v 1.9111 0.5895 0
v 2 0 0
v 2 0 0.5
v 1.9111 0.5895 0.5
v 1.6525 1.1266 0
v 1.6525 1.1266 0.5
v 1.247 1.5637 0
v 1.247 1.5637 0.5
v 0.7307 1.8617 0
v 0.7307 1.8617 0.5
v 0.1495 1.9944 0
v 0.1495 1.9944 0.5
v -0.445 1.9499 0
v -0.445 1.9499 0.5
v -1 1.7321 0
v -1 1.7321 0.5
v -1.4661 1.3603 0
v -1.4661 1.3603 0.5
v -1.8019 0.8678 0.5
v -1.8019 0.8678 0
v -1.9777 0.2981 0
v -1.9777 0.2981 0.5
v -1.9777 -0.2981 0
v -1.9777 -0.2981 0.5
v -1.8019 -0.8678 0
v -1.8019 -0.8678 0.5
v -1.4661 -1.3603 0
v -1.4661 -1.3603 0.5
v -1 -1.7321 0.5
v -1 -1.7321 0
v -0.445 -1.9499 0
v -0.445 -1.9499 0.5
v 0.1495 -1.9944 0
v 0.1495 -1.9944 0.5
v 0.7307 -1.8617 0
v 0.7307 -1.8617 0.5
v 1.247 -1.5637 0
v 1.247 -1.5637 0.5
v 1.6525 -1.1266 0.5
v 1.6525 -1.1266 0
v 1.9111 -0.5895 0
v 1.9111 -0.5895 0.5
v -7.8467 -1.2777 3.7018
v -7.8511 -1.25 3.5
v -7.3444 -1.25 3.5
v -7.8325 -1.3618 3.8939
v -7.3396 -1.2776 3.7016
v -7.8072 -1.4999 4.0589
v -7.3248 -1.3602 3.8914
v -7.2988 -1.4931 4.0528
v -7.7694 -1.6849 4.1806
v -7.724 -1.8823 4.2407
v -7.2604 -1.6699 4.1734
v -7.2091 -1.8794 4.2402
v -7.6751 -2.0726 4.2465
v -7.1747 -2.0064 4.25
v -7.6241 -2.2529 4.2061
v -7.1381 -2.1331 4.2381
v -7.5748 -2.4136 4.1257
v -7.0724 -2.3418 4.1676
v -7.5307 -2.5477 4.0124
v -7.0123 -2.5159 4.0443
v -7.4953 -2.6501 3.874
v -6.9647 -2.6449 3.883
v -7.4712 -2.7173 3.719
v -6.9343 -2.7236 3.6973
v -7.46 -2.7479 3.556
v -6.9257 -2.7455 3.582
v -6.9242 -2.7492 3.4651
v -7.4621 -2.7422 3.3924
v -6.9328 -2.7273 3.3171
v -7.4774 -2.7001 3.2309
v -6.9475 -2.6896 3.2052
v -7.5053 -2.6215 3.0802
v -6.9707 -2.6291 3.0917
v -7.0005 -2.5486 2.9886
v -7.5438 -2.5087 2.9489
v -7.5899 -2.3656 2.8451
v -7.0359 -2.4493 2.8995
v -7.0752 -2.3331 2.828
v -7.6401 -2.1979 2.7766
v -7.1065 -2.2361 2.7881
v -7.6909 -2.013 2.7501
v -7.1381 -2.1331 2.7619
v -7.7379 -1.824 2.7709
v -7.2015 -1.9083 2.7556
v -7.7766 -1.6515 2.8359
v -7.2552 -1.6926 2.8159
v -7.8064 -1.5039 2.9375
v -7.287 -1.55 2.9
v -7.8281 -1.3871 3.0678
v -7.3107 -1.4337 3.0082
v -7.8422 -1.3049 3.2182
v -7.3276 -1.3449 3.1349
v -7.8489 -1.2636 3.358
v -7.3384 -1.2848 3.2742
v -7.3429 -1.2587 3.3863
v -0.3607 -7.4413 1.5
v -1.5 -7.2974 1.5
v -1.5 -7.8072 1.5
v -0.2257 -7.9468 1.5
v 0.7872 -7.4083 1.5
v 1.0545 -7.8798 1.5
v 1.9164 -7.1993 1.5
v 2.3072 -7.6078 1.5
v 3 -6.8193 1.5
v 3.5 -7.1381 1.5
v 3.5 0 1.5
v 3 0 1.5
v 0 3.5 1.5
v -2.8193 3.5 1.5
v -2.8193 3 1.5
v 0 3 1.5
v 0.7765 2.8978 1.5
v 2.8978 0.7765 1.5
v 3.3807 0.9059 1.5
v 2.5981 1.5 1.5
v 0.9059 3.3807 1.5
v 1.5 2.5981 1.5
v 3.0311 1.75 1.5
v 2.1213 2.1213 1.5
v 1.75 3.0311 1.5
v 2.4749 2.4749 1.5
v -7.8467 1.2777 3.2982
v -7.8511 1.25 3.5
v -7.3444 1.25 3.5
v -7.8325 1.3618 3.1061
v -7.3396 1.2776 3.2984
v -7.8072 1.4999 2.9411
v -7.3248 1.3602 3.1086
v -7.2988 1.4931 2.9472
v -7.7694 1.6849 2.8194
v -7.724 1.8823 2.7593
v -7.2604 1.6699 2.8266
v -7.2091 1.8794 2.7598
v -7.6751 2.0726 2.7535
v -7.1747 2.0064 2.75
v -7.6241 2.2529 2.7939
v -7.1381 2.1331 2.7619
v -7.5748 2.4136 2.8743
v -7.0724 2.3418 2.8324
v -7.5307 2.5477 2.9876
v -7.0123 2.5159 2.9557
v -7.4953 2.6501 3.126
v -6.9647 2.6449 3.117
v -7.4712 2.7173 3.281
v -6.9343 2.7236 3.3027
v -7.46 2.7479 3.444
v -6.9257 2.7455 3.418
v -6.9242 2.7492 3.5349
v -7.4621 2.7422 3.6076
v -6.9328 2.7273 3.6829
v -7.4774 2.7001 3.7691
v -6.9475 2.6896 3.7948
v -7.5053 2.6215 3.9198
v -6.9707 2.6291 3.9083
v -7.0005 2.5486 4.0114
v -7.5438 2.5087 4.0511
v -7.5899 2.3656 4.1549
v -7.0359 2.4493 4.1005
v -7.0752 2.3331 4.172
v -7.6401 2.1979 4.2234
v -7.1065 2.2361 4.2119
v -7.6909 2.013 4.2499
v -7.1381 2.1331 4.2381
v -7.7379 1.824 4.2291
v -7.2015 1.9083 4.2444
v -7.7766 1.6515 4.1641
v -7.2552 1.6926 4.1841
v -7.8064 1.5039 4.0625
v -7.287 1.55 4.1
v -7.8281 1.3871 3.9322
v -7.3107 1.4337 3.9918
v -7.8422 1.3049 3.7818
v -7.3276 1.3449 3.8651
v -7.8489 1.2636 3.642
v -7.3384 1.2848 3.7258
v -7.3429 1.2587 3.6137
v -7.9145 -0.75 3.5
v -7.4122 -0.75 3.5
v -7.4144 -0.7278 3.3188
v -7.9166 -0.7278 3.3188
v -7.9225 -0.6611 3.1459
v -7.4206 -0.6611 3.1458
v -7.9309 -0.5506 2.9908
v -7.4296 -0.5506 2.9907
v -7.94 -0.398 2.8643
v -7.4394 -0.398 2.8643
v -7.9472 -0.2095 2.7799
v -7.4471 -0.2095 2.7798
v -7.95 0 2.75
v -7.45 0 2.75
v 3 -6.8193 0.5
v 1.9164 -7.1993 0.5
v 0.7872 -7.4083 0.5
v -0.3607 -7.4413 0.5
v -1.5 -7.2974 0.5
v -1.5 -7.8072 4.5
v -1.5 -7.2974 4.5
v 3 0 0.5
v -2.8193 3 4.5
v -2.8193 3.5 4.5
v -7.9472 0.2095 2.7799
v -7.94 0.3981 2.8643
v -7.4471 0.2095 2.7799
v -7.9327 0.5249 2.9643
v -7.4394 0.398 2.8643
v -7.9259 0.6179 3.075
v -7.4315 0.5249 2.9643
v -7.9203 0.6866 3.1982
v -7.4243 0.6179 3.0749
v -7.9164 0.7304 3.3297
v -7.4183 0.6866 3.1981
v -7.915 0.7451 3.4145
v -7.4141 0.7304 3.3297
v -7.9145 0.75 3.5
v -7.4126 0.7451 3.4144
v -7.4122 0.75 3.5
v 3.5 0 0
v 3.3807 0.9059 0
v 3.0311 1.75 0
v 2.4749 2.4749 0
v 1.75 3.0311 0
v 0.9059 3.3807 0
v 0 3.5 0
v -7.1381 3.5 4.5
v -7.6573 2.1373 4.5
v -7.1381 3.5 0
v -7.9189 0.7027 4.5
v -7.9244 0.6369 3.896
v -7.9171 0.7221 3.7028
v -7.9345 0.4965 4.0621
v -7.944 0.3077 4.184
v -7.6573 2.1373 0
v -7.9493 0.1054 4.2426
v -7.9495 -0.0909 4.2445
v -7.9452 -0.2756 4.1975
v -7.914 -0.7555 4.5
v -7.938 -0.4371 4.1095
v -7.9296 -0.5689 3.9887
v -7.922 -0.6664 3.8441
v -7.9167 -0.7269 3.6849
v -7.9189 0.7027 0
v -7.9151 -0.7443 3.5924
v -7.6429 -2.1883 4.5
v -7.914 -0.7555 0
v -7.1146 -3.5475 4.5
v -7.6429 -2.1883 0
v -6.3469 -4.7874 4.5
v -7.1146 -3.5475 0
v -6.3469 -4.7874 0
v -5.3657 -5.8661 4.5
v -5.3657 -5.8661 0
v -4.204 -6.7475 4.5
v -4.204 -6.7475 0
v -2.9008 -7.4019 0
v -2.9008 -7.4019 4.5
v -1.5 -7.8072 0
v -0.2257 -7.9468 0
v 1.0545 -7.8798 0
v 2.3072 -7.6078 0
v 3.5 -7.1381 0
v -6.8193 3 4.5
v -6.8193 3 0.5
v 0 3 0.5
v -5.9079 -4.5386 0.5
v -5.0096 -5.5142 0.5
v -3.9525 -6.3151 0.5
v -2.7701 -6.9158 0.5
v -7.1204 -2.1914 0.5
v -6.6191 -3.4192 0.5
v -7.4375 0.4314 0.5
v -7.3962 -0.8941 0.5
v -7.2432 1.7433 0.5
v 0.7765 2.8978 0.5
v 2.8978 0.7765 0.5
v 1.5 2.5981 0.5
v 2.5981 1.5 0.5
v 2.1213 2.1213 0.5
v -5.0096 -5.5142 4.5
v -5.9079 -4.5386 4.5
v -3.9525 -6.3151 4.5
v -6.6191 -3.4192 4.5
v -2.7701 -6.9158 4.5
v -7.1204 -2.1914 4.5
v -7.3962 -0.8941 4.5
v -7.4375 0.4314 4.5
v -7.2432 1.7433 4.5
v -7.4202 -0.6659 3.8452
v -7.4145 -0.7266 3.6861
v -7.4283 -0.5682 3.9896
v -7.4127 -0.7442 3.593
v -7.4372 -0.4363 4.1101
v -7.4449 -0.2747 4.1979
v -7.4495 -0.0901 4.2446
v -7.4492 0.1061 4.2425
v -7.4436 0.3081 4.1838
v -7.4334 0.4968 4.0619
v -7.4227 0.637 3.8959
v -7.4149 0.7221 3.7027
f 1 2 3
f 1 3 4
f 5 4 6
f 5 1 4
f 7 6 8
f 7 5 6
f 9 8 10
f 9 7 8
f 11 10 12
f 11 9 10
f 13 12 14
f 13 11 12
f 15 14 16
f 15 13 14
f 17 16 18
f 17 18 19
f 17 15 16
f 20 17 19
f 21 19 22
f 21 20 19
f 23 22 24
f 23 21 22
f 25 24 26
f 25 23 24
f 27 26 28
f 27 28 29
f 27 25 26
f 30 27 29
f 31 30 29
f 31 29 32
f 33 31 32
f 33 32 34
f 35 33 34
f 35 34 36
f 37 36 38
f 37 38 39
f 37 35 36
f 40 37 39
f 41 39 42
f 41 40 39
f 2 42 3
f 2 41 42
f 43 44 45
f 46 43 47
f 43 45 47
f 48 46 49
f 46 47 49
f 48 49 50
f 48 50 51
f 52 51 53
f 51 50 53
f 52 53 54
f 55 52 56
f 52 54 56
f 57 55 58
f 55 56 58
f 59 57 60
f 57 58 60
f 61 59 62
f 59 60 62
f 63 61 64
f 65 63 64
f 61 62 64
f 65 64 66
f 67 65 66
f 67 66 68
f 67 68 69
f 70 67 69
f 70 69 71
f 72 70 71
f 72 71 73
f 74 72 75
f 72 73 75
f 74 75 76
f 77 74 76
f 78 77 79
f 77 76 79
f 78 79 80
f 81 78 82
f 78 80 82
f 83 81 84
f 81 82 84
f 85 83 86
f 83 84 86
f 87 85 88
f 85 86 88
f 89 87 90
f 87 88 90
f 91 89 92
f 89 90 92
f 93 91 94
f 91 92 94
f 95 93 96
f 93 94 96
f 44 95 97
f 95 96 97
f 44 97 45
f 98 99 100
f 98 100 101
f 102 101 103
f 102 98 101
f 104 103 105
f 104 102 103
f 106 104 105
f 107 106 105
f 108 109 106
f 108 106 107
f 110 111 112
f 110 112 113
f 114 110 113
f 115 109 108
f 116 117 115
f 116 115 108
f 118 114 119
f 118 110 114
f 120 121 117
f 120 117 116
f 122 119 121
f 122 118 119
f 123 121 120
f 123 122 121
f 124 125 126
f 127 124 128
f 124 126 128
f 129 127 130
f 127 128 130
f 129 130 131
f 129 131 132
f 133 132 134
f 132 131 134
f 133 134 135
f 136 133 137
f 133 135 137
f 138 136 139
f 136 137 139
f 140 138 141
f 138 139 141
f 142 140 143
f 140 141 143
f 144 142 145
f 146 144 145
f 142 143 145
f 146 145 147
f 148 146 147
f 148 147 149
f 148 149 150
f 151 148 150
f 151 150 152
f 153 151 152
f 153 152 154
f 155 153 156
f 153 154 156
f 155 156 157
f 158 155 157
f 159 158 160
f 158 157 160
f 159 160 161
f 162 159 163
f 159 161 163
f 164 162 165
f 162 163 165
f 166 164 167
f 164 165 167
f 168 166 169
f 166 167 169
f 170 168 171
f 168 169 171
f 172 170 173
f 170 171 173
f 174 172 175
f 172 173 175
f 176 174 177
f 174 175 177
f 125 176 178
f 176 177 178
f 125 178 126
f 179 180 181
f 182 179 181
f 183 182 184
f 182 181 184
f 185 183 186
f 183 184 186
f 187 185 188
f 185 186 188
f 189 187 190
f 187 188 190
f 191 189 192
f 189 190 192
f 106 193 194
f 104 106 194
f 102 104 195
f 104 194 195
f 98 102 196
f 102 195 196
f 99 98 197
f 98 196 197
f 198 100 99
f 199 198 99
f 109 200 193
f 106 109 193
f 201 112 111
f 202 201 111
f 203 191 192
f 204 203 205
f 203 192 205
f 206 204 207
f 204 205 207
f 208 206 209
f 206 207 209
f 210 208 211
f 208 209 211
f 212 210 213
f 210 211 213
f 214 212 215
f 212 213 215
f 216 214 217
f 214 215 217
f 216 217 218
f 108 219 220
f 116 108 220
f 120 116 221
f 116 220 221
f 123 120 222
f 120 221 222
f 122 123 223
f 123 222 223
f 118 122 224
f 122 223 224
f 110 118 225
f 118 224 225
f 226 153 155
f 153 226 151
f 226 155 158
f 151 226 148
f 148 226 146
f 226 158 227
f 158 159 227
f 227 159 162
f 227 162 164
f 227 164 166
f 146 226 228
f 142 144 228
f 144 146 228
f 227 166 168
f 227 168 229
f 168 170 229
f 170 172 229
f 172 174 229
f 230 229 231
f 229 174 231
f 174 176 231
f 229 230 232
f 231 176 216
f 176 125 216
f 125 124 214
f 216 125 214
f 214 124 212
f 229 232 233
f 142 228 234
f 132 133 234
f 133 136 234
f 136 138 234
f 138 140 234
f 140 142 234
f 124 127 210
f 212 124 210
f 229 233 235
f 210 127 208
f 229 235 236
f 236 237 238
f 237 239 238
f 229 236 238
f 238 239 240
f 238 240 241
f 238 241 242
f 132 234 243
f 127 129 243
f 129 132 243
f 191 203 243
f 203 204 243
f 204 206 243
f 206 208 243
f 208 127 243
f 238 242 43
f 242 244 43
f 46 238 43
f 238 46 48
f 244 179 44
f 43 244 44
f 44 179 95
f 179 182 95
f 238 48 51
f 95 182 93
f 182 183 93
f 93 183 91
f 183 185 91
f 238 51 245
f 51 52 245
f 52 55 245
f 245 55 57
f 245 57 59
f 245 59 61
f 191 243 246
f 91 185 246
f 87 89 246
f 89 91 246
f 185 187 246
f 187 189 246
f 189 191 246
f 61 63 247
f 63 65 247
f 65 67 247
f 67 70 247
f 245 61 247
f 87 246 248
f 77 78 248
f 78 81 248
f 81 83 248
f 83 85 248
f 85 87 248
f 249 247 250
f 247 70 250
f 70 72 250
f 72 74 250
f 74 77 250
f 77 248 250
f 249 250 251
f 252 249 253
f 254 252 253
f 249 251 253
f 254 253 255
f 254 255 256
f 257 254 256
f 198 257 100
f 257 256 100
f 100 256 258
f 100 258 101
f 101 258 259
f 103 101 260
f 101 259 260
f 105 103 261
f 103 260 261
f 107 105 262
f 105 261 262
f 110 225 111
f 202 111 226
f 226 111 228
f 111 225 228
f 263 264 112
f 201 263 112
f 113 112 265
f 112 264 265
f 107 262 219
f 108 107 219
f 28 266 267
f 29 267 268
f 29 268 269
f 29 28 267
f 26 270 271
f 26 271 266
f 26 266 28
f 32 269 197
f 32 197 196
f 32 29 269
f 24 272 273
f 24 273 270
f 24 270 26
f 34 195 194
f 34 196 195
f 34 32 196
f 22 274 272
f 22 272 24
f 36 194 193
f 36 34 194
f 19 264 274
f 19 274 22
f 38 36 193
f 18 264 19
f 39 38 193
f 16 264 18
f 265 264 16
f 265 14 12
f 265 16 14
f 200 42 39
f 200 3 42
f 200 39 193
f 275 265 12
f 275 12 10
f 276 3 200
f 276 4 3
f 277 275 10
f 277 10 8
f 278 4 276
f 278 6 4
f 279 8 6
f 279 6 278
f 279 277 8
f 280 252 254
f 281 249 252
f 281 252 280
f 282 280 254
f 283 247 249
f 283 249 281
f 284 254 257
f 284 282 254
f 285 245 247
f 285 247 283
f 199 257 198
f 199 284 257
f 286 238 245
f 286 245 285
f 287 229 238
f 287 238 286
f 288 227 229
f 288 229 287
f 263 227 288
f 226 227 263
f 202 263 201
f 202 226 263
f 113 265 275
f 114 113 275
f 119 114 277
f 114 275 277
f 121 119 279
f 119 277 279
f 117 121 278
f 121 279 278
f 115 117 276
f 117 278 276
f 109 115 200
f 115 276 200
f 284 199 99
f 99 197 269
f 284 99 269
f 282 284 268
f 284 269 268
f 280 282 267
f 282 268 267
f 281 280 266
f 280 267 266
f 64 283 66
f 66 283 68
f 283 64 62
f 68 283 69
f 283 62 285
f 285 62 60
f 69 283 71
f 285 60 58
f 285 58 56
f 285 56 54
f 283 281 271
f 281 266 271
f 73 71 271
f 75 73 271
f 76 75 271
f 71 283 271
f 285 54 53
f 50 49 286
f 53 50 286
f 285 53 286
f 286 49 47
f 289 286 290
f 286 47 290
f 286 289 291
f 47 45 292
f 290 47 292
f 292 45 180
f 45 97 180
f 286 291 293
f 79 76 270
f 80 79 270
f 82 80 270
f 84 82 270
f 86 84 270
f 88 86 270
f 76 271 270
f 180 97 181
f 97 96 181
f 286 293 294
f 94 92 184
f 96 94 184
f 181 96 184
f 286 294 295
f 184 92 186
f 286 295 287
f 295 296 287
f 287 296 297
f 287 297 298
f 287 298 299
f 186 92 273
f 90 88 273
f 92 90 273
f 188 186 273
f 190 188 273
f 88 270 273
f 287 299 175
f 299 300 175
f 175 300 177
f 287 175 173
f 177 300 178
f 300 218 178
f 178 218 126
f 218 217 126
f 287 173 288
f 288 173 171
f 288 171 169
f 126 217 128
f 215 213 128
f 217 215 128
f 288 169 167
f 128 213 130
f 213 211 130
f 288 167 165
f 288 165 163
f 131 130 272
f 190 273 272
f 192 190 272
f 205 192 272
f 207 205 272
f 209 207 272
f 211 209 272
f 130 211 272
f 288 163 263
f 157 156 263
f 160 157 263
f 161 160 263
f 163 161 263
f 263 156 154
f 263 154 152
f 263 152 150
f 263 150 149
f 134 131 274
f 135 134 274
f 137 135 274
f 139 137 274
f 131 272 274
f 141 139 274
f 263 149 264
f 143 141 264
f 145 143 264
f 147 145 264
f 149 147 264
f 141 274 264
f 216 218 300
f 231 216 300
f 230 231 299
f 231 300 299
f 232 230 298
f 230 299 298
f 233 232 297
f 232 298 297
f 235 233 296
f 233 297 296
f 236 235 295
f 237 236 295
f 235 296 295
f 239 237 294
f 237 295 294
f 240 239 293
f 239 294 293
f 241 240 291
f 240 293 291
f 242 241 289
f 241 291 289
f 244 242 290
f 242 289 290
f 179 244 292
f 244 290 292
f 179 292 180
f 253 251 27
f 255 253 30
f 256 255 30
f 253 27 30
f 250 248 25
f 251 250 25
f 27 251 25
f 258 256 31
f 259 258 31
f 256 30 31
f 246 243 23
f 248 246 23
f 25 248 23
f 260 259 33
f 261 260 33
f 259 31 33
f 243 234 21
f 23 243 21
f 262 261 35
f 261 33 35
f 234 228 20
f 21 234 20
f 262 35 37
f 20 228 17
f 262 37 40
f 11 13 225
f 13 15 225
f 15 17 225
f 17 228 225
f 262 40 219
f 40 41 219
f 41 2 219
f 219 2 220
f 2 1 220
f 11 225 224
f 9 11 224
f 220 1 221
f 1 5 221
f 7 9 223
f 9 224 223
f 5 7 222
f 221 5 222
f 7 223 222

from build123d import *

# Parameters (mm, degrees)
F0_R          = 2
F1_DEPTH      = 0.5
F2_DEPTH      = 1.5
F3_DEPTH      = 4.5
F5_R          = 0.75
F6_DEPTH      = 22
F6_DEPTH_BACK = 1.8118981114


# Not quite as in the source:
# - an extrude ends at something that could not be found from the text; its depth is read off the source's solid
# - a feature names something its author has since deleted; it is built from what else it names


with BuildPart() as f1:
    # F0 (on Top) → F1 (new body)
    with BuildSketch(Plane.XY):
        with BuildLine():
            ThreePointArc((3, -1.8027756377), (3.3726843908, -0.9354143467), (3.5, 0))
            ThreePointArc((3.5, 0), (2.4748737342, 2.4748737342), (0, 3.5))
            ThreePointArc((0, 3.5), (-0.9354143467, 3.3726843908), (-1.8027756377, 3))
            Line((-1.8027756377, 3), (0, 3))
            ThreePointArc((0, 3), (2.1213203436, 2.1213203436), (3, 0))
            Line((3, 0), (3, -1.8027756377))
        make_face()
        with BuildLine():
            ThreePointArc((-1.8027756377, 3), (-0.9354143467, 3.3726843908), (0, 3.5))
            Line((0, 3.5), (-2.8192741549, 3.5))
            Line((-2.8192741549, 3.5), (-2.8192741549, 3))
            Line((-2.8192741549, 3), (-1.8027756377, 3))
        make_face()
        with BuildLine():
            Line((3.5, -7.1381019886), (3.5, -6.5766632877))
            ThreePointArc((3.5, -6.5766632877), (3.2522630595, -6.7026326911), (3, -6.8192741549))
            ThreePointArc((3, -6.8192741549), (0.7871839081, -7.4082954514), (-1.5, -7.2974310548))
            Line((-1.5, -7.2974310548), (-1.5, -7.8072082078))
            ThreePointArc((-1.5, -7.8072082078), (1.0544789155, -7.8797572435), (3.5, -7.1381019886))
        make_face()
        with BuildLine():
            Line((3.5, -6.5766632877), (3.5, 0))
            ThreePointArc((3.5, 0), (3.3726843908, -0.9354143467), (3, -1.8027756377))
            Line((3, -1.8027756377), (3, -6.8192741549))
            ThreePointArc((3, -6.8192741549), (3.2522630595, -6.7026326911), (3.5, -6.5766632877))
        make_face()
        with BuildLine():
            Line((3, -6.8192741549), (3, -1.8027756377))
            ThreePointArc((3, -1.8027756377), (-2.4748737342, -2.4748737342), (-1.8027756377, 3))
            Line((-1.8027756377, 3), (-2.8192741549, 3))
            Line((-2.8192741549, 3), (-6.8192741549, 3))
            ThreePointArc((-6.8192741549, 3), (-6.619052213, -3.4191589319), (-1.5, -7.2974310548))
            ThreePointArc((-1.5, -7.2974310548), (0.7871839081, -7.4082954514), (3, -6.8192741549))
        make_face()
        with BuildLine():
            ThreePointArc((-1.8027756377, 3), (-2.4748737342, -2.4748737342), (3, -1.8027756377))
            Line((3, -1.8027756377), (3, 0))
            ThreePointArc((3, 0), (-2.1213203436, -2.1213203436), (0, 3))
            Line((0, 3), (-1.8027756377, 3))
        make_face()
        with BuildLine():
            ThreePointArc((0, 3), (-2.1213203436, -2.1213203436), (3, 0))
            ThreePointArc((3, 0), (2.1213203436, 2.1213203436), (0, 3))
        make_face()
        Circle(F0_R, mode=Mode.SUBTRACT)
    extrude(amount=F1_DEPTH)

    # F0 (on Top) → F2 (join)
    with BuildSketch(Plane.XY):
        with BuildLine():
            Line((3.5, -7.1381019886), (3.5, -6.5766632877))
            ThreePointArc((3.5, -6.5766632877), (3.2522630595, -6.7026326911), (3, -6.8192741549))
            ThreePointArc((3, -6.8192741549), (0.7871839081, -7.4082954514), (-1.5, -7.2974310548))
            Line((-1.5, -7.2974310548), (-1.5, -7.8072082078))
            ThreePointArc((-1.5, -7.8072082078), (1.0544789155, -7.8797572435), (3.5, -7.1381019886))
        make_face()
        with BuildLine():
            Line((3.5, -6.5766632877), (3.5, 0))
            ThreePointArc((3.5, 0), (3.3726843908, -0.9354143467), (3, -1.8027756377))
            Line((3, -1.8027756377), (3, -6.8192741549))
            ThreePointArc((3, -6.8192741549), (3.2522630595, -6.7026326911), (3.5, -6.5766632877))
        make_face()
        with BuildLine():
            ThreePointArc((3, -1.8027756377), (3.3726843908, -0.9354143467), (3.5, 0))
            ThreePointArc((3.5, 0), (2.4748737342, 2.4748737342), (0, 3.5))
            ThreePointArc((0, 3.5), (-0.9354143467, 3.3726843908), (-1.8027756377, 3))
            Line((-1.8027756377, 3), (0, 3))
            ThreePointArc((0, 3), (2.1213203436, 2.1213203436), (3, 0))
            Line((3, 0), (3, -1.8027756377))
        make_face()
        with BuildLine():
            ThreePointArc((-1.8027756377, 3), (-0.9354143467, 3.3726843908), (0, 3.5))
            Line((0, 3.5), (-2.8192741549, 3.5))
            Line((-2.8192741549, 3.5), (-2.8192741549, 3))
            Line((-2.8192741549, 3), (-1.8027756377, 3))
        make_face()
        with BuildLine():
            Line((-2.8192741549, 3), (-2.8192741549, 3.5))
            Line((-2.8192741549, 3.5), (-6.5766632877, 3.5))
            ThreePointArc((-6.5766632877, 3.5), (-6.7026326911, 3.2522630595), (-6.8192741549, 3))
            Line((-6.8192741549, 3), (-2.8192741549, 3))
        make_face()
        with BuildLine():
            ThreePointArc((-6.8192741549, 3), (-6.7026326911, 3.2522630595), (-6.5766632877, 3.5))
            Line((-6.5766632877, 3.5), (-7.1381019886, 3.5))
            ThreePointArc((-7.1381019886, 3.5), (-7.114593513, -3.5475426911), (-1.5, -7.8072082078))
            Line((-1.5, -7.8072082078), (-1.5, -7.2974310548))
            ThreePointArc((-1.5, -7.2974310548), (-6.619052213, -3.4191589319), (-6.8192741549, 3))
        make_face()
    extrude(amount=F2_DEPTH)

    # F0 (on Top) → F3 (join)
    with BuildSketch(Plane.XY):
        with BuildLine():
            ThreePointArc((-6.8192741549, 3), (-6.7026326911, 3.2522630595), (-6.5766632877, 3.5))
            Line((-6.5766632877, 3.5), (-7.1381019886, 3.5))
            ThreePointArc((-7.1381019886, 3.5), (-7.114593513, -3.5475426911), (-1.5, -7.8072082078))
            Line((-1.5, -7.8072082078), (-1.5, -7.2974310548))
            ThreePointArc((-1.5, -7.2974310548), (-6.619052213, -3.4191589319), (-6.8192741549, 3))
        make_face()
        with BuildLine():
            Line((-2.8192741549, 3), (-2.8192741549, 3.5))
            Line((-2.8192741549, 3.5), (-6.5766632877, 3.5))
            ThreePointArc((-6.5766632877, 3.5), (-6.7026326911, 3.2522630595), (-6.8192741549, 3))
            Line((-6.8192741549, 3), (-2.8192741549, 3))
        make_face()
    extrude(amount=F3_DEPTH)

    # F5 (on plane+point) → F6 (cut, two sides)
    with BuildSketch(Plane.YZ.offset(-7.1381019886)) as f6_sk:
        with BuildLine():
            ThreePointArc((2.75, 3.5), (2, 4.25), (1.25, 3.5))
            ThreePointArc((1.25, 3.5), (2, 2.75), (2.75, 3.5))
        make_face()
        with BuildLine():
            Line((0, 3.5), (0, 2.75))
            ThreePointArc((0, 2.75), (0.5303300859, 2.9696699141), (0.75, 3.5))
            Line((0.75, 3.5), (0, 3.5))
        make_face()
        with BuildLine():
            Line((-0.75, 3.5), (0, 3.5))
            Line((0, 3.5), (0.75, 3.5))
            ThreePointArc((0.75, 3.5), (0, 4.25), (-0.75, 3.5))
        make_face()
        with BuildLine():
            ThreePointArc((-0.75, 3.5), (-0.5303300859, 2.9696699141), (0, 2.75))
            Line((0, 2.75), (0, 3.5))
            Line((0, 3.5), (-0.75, 3.5))
        make_face()
        with Locations((-2, 3.5)):
            Circle(F5_R)
    extrude(amount=F6_DEPTH, mode=Mode.SUBTRACT)
    extrude(f6_sk.sketch, amount=-F6_DEPTH_BACK, mode=Mode.SUBTRACT)


solid = f1.part
